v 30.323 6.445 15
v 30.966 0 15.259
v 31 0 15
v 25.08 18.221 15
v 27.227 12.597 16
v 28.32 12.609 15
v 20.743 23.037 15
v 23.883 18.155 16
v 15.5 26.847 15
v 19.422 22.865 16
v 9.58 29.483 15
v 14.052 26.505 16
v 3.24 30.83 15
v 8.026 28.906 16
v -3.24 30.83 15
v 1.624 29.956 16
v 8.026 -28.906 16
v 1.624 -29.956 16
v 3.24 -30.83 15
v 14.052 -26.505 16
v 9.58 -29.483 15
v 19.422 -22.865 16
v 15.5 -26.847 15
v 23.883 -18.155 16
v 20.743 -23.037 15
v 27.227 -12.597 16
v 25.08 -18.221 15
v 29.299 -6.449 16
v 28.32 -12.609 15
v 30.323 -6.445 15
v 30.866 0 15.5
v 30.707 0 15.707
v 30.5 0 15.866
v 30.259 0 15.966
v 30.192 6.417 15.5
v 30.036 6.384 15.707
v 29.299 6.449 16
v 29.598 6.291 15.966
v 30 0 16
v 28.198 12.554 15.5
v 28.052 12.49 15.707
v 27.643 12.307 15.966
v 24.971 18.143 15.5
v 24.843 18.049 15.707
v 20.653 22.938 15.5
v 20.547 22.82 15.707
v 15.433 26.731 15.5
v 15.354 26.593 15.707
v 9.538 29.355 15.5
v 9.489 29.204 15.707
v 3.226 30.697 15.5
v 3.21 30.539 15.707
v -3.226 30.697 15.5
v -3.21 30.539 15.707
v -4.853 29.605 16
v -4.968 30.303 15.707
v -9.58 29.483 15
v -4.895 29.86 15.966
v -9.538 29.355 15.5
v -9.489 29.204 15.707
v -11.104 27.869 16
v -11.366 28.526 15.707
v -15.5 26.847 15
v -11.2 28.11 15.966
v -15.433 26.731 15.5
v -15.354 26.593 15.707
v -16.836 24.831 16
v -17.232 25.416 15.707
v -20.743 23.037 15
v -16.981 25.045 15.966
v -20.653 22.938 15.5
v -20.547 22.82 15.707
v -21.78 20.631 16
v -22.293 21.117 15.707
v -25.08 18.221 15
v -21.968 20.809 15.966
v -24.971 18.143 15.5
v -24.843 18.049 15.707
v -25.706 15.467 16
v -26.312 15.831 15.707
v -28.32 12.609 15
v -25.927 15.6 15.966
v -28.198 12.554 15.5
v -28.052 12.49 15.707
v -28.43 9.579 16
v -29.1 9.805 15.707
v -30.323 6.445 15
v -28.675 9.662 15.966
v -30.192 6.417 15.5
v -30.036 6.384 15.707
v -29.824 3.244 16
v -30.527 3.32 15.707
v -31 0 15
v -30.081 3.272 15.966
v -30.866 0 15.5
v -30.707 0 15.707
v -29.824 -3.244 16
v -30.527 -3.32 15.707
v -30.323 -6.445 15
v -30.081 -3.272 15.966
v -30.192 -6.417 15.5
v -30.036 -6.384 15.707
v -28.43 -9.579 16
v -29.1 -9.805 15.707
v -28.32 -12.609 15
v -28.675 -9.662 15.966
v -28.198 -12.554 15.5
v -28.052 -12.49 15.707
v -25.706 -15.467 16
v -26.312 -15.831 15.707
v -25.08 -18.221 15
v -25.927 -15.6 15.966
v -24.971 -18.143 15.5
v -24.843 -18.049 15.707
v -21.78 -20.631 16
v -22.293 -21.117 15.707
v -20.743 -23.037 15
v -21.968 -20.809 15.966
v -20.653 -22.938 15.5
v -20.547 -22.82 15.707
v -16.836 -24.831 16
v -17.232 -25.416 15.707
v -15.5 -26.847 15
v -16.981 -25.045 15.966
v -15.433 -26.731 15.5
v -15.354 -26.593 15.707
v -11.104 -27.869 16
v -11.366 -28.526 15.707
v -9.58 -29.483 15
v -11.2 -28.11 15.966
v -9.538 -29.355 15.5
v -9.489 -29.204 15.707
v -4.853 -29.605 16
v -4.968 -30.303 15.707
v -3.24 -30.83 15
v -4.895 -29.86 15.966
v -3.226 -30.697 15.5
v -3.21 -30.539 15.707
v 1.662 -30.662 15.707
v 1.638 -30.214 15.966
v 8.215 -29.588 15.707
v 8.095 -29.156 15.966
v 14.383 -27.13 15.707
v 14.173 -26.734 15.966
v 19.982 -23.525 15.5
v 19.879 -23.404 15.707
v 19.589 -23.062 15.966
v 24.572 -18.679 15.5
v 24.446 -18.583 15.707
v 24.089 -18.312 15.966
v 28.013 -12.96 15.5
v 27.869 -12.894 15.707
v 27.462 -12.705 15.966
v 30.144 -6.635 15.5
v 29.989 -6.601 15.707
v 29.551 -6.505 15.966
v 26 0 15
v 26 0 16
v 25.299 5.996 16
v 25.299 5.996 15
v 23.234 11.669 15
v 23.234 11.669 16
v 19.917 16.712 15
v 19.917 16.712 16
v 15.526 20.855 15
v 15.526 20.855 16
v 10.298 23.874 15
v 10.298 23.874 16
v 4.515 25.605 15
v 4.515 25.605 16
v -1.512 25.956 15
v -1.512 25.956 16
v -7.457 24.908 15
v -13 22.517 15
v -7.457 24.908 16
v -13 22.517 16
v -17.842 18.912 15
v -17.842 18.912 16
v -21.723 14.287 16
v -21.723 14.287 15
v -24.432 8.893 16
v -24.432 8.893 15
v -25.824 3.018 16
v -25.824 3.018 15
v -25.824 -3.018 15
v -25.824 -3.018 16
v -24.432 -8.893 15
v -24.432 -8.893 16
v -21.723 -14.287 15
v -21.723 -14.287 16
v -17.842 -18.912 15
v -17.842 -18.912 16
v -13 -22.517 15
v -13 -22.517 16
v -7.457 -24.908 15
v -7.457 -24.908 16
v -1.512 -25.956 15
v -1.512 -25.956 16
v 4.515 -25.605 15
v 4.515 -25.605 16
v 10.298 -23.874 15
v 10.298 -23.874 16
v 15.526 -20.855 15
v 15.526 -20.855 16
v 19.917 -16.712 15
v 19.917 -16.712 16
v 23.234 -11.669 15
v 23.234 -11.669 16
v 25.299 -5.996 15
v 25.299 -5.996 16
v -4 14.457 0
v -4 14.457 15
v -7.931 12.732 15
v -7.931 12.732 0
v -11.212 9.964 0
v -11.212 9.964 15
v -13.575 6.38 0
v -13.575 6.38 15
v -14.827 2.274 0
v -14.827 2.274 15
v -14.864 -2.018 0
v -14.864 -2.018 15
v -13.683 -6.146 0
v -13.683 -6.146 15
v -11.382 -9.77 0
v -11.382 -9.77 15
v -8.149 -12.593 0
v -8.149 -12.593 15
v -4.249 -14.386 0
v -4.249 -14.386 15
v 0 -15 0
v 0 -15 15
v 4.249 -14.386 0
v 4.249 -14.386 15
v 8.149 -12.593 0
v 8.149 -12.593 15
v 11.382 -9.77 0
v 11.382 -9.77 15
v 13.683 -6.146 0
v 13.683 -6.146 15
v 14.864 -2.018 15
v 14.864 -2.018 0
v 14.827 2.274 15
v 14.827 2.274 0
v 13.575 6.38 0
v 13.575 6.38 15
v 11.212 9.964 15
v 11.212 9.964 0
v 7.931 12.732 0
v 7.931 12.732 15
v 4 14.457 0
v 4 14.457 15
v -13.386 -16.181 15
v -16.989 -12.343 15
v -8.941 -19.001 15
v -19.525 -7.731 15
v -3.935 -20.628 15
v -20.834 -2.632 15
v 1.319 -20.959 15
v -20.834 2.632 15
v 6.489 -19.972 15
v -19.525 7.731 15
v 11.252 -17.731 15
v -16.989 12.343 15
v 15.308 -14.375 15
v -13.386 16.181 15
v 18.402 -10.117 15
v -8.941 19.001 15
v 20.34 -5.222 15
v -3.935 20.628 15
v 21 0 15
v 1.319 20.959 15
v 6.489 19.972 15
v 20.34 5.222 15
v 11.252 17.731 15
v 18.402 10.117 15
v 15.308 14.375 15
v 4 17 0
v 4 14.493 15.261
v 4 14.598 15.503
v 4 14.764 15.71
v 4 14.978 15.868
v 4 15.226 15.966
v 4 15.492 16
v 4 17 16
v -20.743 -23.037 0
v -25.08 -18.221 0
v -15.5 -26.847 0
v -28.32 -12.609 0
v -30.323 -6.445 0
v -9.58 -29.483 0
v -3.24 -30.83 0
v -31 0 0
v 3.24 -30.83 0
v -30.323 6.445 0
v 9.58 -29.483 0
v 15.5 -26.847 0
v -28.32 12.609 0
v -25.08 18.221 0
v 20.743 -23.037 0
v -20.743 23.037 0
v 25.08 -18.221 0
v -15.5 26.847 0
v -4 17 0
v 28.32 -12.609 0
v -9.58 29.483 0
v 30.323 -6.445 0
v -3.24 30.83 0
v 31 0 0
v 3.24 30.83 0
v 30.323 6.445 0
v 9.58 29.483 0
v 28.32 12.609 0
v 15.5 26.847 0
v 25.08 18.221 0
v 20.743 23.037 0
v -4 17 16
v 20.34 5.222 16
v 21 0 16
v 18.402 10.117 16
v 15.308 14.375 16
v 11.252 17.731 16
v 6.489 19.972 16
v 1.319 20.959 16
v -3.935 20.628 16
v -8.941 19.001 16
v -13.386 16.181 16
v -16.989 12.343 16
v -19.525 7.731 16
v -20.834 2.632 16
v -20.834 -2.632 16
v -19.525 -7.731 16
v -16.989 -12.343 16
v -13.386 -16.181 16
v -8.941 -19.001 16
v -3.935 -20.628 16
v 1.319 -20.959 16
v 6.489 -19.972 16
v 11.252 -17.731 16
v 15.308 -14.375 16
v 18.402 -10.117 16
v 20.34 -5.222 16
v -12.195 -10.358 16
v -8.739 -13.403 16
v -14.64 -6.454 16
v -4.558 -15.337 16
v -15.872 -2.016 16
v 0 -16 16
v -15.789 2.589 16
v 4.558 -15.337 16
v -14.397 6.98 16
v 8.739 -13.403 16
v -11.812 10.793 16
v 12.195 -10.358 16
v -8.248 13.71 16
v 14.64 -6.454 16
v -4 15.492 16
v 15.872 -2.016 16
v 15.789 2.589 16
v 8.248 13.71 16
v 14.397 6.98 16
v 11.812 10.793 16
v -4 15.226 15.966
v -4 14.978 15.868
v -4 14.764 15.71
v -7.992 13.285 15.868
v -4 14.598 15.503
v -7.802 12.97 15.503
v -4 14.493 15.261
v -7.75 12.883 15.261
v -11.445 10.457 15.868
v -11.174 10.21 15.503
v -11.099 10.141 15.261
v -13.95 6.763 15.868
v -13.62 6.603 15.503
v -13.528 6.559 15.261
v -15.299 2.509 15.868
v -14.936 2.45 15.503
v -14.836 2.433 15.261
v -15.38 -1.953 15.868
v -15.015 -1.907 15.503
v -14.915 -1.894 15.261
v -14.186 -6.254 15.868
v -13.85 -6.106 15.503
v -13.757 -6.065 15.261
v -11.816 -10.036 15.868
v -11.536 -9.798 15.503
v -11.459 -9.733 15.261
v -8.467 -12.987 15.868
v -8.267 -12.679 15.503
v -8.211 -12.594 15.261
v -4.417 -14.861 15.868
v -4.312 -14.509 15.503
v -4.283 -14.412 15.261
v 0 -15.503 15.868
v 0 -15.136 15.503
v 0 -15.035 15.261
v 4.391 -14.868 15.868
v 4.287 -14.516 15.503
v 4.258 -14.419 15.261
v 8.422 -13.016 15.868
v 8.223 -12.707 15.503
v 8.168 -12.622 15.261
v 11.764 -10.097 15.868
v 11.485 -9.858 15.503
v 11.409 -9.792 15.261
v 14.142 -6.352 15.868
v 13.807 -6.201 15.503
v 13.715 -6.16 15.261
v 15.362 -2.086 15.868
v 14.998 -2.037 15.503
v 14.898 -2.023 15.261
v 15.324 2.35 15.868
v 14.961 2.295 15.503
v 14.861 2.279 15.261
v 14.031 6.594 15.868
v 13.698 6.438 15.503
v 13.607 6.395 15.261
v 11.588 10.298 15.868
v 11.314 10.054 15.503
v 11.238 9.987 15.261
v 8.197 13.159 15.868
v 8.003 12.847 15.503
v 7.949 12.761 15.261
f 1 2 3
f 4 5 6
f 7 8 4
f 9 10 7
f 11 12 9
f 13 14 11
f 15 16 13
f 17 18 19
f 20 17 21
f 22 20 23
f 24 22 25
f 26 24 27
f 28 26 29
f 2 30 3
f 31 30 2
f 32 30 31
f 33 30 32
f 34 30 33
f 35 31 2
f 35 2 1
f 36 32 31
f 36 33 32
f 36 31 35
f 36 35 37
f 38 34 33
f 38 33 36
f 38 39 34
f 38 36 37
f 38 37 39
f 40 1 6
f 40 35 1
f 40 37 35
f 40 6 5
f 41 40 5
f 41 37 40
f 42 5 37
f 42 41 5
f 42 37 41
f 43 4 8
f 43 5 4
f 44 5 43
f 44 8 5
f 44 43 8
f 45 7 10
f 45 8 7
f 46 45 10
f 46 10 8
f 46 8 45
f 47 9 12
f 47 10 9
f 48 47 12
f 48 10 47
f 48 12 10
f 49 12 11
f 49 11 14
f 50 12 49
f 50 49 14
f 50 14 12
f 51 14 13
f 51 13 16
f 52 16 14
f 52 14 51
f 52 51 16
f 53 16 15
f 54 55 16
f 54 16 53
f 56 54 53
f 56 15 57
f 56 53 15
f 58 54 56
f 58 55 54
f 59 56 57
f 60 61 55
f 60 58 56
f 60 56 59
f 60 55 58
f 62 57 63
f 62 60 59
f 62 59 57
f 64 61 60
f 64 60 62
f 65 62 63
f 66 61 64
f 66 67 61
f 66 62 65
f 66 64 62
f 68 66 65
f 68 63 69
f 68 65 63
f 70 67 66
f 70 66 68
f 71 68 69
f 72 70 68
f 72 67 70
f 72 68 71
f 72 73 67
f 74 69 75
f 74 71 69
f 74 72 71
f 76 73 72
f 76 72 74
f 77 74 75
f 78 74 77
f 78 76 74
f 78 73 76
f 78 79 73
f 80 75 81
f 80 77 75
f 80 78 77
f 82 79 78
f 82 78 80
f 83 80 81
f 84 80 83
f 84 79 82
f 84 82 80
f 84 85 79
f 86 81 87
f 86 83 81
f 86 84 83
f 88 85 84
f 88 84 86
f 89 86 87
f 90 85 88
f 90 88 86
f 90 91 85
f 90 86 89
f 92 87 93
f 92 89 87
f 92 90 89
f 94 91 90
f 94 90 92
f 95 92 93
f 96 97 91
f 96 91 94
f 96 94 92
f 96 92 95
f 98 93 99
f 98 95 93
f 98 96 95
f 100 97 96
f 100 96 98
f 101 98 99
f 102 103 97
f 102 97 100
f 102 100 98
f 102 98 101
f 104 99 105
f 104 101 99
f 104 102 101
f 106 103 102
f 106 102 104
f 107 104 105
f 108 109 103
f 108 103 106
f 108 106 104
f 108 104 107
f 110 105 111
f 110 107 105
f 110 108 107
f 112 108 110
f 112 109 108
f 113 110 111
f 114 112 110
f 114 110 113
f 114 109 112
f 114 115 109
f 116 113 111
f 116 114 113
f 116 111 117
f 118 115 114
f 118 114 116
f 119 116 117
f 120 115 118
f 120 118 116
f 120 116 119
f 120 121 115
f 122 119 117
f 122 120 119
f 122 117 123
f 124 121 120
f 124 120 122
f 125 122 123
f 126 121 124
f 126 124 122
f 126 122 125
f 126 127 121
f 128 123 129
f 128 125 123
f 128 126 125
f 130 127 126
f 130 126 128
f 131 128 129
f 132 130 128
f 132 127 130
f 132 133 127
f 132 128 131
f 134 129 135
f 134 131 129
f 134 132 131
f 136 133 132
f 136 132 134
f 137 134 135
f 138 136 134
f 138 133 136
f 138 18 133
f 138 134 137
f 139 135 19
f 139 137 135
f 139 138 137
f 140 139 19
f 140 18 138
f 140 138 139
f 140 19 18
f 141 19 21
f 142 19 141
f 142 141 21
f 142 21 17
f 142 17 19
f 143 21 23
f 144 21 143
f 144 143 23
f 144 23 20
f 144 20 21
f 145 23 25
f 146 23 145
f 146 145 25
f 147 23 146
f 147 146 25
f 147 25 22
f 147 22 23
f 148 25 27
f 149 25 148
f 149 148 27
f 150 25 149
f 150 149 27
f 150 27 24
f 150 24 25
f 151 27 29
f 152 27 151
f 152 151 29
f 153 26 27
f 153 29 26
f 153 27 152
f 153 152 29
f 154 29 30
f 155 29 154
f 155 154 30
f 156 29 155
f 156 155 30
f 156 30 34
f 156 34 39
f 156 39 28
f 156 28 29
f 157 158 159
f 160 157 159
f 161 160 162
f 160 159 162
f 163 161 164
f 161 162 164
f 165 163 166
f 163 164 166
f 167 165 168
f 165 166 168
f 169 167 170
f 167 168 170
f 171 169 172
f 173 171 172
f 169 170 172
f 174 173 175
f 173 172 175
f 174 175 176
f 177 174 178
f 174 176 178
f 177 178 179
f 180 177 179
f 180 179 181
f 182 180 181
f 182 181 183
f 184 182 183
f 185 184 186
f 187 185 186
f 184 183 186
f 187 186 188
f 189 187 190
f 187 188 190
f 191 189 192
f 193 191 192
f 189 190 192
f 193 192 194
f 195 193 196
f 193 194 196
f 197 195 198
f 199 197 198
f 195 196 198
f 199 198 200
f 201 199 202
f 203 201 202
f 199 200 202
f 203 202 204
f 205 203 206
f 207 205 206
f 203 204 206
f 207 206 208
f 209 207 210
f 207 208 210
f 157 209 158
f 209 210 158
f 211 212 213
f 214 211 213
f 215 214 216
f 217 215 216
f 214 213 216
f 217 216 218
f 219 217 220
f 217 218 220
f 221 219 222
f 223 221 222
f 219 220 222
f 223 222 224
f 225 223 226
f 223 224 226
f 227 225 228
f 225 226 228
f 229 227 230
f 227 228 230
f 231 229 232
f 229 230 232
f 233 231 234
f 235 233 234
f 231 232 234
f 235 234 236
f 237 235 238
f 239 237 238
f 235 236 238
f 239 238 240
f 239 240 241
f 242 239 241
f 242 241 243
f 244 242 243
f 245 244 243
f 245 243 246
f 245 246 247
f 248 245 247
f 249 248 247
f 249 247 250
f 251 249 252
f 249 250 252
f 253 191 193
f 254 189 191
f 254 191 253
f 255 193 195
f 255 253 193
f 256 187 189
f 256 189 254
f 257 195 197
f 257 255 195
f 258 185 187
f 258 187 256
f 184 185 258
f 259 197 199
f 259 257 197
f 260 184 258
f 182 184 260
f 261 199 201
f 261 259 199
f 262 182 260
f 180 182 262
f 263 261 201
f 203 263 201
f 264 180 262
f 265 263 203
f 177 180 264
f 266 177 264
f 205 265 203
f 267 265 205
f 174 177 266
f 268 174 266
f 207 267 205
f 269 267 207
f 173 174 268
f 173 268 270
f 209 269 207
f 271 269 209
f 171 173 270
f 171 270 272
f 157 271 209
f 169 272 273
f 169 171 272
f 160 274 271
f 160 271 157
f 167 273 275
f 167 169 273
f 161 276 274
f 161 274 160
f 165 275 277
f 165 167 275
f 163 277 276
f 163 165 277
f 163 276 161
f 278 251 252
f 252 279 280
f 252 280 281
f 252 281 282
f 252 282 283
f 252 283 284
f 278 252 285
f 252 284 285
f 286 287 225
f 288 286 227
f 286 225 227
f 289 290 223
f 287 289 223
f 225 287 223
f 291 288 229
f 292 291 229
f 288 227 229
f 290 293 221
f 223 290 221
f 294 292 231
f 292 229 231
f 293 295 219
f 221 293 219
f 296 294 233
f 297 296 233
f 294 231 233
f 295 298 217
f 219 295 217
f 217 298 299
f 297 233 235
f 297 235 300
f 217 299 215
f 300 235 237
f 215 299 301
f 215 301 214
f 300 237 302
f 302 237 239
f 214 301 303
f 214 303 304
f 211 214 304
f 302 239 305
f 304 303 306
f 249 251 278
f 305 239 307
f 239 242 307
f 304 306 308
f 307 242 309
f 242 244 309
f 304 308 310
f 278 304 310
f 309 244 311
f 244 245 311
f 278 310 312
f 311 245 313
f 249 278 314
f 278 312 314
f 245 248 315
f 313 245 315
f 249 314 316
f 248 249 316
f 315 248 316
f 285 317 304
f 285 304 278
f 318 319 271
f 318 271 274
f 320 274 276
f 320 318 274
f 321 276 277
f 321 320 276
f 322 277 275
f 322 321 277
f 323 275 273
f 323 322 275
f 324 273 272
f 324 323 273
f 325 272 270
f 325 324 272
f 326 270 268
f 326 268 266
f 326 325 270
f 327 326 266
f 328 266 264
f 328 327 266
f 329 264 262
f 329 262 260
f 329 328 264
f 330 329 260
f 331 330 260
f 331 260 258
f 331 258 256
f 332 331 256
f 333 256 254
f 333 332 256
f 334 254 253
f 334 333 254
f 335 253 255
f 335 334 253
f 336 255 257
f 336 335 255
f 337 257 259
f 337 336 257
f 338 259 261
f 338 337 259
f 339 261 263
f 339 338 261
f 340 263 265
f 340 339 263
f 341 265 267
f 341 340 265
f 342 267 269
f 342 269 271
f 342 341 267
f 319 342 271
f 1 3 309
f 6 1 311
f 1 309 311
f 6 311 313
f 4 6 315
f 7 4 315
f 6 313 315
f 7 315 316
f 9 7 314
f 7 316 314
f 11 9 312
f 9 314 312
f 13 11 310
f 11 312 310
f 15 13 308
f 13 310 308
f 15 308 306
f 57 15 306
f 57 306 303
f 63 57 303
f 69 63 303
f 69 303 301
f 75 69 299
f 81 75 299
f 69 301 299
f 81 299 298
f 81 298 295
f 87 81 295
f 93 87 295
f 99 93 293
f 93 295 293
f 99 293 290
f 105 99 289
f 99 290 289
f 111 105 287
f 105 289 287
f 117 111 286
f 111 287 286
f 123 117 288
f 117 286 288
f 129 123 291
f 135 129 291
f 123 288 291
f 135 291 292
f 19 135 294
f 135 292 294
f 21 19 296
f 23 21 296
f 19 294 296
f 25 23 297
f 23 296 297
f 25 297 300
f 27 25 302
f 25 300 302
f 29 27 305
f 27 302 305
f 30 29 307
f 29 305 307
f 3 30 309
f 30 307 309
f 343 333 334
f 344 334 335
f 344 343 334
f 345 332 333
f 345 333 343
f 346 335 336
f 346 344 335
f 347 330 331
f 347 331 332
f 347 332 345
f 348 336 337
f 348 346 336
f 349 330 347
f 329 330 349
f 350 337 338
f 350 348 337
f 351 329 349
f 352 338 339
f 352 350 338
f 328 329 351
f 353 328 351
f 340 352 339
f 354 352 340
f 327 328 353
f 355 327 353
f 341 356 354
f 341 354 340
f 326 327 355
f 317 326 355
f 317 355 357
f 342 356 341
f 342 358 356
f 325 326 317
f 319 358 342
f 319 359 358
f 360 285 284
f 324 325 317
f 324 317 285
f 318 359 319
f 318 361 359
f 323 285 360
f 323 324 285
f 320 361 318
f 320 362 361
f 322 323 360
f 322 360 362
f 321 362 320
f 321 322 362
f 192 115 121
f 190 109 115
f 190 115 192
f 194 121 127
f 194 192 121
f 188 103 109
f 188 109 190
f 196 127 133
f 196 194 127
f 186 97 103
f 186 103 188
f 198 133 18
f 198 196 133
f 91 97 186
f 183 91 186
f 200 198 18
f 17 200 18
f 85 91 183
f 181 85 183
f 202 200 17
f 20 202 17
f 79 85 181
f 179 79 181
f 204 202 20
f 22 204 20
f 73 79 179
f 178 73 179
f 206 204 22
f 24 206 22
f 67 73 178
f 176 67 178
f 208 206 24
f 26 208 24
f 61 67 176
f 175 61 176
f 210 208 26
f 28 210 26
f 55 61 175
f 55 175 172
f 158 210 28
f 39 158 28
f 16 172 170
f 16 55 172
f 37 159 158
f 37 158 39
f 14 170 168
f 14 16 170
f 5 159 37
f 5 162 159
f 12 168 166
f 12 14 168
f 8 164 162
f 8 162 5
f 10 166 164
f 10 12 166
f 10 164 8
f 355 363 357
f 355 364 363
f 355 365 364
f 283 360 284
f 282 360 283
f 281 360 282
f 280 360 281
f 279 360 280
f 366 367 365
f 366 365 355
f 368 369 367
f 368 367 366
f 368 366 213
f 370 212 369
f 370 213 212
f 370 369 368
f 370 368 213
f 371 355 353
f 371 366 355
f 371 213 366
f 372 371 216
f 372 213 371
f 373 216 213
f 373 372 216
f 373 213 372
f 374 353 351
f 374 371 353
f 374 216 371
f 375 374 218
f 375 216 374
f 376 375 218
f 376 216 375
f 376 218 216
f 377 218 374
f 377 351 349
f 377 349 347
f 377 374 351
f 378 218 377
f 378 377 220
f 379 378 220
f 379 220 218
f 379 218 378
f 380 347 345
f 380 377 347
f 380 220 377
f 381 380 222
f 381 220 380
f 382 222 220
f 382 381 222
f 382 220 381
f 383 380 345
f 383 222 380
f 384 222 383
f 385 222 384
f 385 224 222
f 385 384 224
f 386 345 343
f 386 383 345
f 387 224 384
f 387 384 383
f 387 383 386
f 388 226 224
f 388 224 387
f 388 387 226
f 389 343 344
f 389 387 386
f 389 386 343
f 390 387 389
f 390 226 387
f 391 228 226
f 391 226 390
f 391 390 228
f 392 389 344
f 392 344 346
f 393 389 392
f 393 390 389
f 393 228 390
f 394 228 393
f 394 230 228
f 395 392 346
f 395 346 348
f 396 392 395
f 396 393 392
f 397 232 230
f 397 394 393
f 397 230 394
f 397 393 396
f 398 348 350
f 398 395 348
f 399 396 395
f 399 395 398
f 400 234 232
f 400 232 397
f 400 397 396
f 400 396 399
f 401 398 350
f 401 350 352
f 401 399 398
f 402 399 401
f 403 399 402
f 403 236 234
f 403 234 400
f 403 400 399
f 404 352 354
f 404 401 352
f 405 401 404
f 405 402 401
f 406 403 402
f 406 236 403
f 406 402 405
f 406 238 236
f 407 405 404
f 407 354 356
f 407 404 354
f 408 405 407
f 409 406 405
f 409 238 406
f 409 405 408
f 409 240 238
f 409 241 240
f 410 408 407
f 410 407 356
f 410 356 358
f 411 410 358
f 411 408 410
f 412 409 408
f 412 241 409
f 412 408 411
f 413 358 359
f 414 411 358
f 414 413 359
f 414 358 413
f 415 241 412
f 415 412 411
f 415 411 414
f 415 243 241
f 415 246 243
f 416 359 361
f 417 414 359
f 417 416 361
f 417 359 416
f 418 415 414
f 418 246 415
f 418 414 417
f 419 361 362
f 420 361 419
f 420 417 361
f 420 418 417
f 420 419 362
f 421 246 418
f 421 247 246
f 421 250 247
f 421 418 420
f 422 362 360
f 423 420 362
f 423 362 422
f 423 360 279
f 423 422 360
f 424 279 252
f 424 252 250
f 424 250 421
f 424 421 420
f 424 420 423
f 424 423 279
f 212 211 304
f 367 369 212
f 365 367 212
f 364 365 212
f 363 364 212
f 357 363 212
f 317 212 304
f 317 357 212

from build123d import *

# Parameters (mm, degrees)
F0_R     = 31
F1_DEPTH = 16
F2_R     = 26
F2_R_2   = 21
F3_DEPTH = 1
F4_R     = 15
F5_DEPTH = 25
F6_W     = 8
F6_H     = 3
F7_DEPTH = 25
F8_R     = 1


with BuildPart() as f1:
    # F0 (on Top) → F1 (new body)
    with BuildSketch(Plane.XY):
        Circle(F0_R)
    extrude(amount=F1_DEPTH)

    # F2 (on face) → F3 (cut)
    with BuildSketch(Plane.XY.offset(16)):
        Circle(F2_R)
        Circle(F2_R_2, mode=Mode.SUBTRACT)
    extrude(amount=-F3_DEPTH, mode=Mode.SUBTRACT)

    # F4 (on face) → F5 (cut)
    with BuildSketch(Plane.XY.offset(16)):
        Circle(F4_R)
    extrude(amount=-F5_DEPTH, mode=Mode.SUBTRACT)

    # F6 (on face) → F7 (cut)
    with BuildSketch(Plane.XY.offset(16)):
        with Locations((0, 15.5)):
            Rectangle(F6_W, F6_H)
    extrude(amount=-F7_DEPTH, mode=Mode.SUBTRACT)

    # F8
    f8_edges = [f1.edges().sort_by_distance(p)[0] for p in [
        (0, -15, 16),
        (-31, 0, 16),
    ]]
    fillet(f8_edges, radius=F8_R)


solid = f1.part
